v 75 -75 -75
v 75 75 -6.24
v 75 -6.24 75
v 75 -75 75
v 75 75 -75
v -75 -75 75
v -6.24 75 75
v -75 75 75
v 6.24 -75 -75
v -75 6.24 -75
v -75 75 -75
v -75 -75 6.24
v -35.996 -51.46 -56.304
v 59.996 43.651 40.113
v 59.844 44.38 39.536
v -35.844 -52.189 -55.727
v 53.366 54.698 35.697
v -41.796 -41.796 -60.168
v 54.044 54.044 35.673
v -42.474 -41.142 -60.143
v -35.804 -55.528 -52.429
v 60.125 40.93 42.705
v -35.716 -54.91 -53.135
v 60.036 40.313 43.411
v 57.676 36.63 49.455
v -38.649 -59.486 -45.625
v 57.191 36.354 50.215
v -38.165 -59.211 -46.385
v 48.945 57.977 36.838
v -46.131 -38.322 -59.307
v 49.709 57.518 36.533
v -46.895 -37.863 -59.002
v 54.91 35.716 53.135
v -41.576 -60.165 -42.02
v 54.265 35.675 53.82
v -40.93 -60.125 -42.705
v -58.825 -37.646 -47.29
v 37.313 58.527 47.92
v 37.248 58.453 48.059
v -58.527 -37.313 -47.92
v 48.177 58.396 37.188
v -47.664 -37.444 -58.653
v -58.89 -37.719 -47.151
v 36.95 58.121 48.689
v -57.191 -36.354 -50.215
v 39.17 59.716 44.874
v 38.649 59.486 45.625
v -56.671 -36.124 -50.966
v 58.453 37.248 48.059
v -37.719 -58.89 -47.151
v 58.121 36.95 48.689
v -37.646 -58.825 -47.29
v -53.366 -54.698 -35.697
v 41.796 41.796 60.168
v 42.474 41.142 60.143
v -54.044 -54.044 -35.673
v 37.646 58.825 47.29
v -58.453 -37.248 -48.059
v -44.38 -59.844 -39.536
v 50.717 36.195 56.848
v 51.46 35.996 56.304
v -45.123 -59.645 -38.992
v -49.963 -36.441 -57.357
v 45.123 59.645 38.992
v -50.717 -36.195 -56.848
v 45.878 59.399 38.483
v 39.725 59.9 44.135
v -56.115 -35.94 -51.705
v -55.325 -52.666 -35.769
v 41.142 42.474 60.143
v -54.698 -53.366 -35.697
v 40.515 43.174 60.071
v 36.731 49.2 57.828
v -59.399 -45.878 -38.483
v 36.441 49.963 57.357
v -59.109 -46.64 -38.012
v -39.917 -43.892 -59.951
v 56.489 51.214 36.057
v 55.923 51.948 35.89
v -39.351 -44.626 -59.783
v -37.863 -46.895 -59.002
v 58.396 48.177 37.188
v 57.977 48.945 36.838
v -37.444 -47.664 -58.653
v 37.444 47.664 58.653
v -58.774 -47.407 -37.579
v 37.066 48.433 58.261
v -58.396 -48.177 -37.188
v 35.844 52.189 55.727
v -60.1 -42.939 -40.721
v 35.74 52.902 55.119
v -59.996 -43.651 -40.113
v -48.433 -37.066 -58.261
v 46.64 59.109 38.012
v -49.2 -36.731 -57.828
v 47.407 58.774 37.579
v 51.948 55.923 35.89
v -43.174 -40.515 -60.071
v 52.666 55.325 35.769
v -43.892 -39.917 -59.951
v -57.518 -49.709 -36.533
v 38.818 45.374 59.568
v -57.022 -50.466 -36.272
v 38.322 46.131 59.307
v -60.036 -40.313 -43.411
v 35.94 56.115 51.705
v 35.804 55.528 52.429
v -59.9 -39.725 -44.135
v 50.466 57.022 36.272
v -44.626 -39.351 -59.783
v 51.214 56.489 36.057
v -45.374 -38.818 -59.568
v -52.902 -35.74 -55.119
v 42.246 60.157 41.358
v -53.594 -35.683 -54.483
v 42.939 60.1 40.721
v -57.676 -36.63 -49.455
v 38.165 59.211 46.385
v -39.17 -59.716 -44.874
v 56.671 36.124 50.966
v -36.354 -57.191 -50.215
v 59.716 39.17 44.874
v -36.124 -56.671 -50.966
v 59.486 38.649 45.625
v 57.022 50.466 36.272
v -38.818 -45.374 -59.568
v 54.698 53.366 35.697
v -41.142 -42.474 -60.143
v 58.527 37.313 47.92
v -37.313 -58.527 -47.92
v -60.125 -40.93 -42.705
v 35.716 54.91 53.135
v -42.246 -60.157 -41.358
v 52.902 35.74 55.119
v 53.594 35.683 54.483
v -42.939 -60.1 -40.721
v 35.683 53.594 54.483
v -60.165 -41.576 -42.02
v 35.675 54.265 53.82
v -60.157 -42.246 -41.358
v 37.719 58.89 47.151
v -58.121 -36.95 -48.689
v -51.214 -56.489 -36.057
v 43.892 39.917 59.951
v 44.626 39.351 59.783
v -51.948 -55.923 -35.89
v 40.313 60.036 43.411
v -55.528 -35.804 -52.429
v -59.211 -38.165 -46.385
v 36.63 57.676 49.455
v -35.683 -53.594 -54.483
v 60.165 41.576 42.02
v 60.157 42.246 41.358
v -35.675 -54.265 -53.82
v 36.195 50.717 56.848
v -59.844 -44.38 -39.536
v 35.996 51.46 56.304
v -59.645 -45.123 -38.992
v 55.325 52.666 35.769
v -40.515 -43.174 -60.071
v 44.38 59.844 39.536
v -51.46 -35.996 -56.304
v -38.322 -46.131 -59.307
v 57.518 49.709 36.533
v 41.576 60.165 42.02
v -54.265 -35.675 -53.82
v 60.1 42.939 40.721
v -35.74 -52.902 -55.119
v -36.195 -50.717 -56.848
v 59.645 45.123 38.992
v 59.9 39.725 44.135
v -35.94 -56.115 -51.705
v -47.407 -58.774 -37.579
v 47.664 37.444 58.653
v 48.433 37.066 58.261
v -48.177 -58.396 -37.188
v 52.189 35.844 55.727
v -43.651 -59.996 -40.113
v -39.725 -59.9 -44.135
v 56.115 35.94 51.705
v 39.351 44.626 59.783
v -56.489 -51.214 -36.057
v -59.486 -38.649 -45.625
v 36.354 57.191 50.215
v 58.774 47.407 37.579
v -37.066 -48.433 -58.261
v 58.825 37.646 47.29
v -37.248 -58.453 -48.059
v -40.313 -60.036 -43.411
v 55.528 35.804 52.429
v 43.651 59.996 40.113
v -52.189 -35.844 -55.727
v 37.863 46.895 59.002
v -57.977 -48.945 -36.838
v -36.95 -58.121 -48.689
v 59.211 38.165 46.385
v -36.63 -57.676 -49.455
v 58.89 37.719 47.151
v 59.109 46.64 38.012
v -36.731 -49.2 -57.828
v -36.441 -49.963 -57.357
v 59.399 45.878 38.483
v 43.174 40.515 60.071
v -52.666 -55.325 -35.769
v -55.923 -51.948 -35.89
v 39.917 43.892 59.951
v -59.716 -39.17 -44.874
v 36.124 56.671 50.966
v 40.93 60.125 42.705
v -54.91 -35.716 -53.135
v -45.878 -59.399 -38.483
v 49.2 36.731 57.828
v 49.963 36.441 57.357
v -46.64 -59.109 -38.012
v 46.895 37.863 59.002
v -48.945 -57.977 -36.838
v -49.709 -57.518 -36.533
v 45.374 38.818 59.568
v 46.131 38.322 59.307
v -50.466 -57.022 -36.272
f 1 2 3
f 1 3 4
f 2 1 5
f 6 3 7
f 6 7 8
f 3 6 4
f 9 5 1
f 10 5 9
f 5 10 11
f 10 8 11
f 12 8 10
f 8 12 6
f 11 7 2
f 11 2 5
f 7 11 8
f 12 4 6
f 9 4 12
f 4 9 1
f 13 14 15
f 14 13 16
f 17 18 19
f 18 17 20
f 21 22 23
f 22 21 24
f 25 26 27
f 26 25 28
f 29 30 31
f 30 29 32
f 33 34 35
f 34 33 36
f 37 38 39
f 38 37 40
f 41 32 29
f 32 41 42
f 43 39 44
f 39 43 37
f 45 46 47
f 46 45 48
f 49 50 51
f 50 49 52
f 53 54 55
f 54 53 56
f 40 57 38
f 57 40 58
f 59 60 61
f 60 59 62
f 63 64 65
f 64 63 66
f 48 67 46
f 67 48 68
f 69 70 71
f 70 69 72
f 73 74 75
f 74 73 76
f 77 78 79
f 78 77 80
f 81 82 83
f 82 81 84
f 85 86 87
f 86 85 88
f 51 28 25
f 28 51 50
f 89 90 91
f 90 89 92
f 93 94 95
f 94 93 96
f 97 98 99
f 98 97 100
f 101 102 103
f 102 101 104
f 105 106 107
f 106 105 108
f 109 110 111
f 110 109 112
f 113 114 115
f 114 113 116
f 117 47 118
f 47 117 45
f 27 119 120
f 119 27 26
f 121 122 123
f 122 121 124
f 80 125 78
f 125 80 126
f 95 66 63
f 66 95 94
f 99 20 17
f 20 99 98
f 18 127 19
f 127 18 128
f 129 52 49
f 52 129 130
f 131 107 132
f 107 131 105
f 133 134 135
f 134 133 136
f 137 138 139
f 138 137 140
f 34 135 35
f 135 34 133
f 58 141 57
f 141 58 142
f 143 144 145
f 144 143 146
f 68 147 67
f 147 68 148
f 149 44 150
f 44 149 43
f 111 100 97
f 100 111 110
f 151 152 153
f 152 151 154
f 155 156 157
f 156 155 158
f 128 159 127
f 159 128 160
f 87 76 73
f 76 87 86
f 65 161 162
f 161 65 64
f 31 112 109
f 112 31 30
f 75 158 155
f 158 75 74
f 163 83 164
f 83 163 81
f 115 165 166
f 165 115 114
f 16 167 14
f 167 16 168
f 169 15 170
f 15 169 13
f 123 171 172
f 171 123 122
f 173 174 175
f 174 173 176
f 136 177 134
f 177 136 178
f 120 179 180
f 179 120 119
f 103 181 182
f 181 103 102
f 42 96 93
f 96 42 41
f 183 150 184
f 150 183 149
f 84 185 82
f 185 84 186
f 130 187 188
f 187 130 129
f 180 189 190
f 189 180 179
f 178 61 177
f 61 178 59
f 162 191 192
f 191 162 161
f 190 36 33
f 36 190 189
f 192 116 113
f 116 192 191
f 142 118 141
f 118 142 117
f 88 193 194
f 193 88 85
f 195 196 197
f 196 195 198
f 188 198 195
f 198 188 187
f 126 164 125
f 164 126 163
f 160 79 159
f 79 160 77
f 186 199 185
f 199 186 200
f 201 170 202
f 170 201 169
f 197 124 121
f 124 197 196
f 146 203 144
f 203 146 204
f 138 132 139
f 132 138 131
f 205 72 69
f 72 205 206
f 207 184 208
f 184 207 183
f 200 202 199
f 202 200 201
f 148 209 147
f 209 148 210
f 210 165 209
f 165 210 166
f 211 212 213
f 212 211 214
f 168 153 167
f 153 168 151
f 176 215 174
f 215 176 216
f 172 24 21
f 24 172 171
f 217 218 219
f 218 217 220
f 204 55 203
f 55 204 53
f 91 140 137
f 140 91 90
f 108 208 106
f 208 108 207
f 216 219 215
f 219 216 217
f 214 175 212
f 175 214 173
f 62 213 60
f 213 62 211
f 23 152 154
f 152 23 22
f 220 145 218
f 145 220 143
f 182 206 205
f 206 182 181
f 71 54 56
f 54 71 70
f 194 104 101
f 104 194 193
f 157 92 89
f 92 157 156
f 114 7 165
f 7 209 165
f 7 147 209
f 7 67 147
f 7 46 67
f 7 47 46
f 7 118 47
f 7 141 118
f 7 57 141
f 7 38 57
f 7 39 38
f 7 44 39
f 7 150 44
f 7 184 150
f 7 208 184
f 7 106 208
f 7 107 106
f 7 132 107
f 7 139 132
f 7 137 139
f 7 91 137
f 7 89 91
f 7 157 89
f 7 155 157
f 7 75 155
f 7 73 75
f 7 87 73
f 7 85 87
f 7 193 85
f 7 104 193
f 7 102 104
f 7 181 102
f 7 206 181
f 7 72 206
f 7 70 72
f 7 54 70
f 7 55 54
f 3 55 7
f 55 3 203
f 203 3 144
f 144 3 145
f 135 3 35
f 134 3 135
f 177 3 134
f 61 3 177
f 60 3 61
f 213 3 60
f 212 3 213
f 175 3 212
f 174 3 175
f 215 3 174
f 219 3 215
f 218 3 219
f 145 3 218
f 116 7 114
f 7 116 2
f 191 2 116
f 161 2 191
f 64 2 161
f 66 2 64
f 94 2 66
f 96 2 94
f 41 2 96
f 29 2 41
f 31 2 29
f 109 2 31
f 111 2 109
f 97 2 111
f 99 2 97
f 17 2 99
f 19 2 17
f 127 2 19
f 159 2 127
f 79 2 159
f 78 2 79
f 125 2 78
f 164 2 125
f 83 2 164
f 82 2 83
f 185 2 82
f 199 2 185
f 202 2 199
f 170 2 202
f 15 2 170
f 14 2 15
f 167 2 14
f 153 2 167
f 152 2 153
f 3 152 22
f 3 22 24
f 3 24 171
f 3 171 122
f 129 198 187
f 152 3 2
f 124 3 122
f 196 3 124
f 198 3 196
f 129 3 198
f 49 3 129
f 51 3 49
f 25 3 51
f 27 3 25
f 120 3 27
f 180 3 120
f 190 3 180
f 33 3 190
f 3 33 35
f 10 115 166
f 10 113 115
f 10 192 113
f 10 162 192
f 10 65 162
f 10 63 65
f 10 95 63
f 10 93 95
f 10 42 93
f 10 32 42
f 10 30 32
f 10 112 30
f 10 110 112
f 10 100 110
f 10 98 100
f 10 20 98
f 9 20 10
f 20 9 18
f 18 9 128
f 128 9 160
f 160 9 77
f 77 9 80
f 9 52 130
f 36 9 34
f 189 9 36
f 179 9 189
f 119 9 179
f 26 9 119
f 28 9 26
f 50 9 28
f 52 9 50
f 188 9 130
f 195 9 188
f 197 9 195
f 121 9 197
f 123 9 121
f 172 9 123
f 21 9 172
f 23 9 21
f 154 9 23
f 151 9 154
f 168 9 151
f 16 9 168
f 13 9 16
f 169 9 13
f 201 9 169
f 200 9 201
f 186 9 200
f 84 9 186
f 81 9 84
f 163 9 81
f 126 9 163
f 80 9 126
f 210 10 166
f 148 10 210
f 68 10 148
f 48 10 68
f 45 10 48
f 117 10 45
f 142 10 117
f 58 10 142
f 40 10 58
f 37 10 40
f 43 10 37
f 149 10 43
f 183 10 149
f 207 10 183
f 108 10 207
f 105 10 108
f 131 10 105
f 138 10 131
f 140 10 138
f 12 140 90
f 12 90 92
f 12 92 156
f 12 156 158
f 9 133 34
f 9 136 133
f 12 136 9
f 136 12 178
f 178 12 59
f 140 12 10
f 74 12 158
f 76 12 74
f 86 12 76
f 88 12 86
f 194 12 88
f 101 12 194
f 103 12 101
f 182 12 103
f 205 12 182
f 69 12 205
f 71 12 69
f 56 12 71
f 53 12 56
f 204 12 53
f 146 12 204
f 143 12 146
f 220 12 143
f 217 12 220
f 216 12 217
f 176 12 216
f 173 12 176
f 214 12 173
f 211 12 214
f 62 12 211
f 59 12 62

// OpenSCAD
// file: Library_2021.scad
$fn = 100;//This number should normally be around or at 100.


//===========================================================================================================================
//===========================================================================================================================
module sqaure_torus(outerXlength, outerYlength, innerXlength, innerYlength, obritalDis, angleHere){//Sqaure torus
rotate_extrude(angle = angleHere,convexity = 10){
translate([obritalDis + outerXlength / 2, outerYlength / 2, 0])
    difference(){
        square([outerXlength, outerYlength], center = true);
        square([innerXlength, innerYlength], center = true);
        
        }
    }
}
//===========================================================================================================================
//===========================================================================================================================
module torus(outerRadius, innerRadius, orbitalDistance, angleHere){// Donut shape
    rotate_extrude(angle= angleHere, convexity= 10){
        translate([orbitalDistance, 0, 0])
            difference(){
                circle(outerRadius);
                circle(innerRadius);
                }
        }
    assert(angleHere <= 360, "angle is greater than 360!");
    assert(outerRadius > innerRadius, "Inner circle is greater than outer circle!");
    assert(orbitalDistance > 0, "orbital radius is less than zero!");
    }
//===========================================================================================================================
//===========================================================================================================================
module orbital_cylinders(OrbitalRadius, NumberOfCylinders, cylinderRadius, Height, Xtilt, Ytilt){// cuts circles in a circle
    for (Hole = [0:NumberOfCylinders]){
        rotate([0, 0, 360/NumberOfCylinders])
        translate([OrbitalRadius, 0, 0])
        rotate([Xtilt, Ytilt,0])
            cylinder(Height, r= cylinderRadius);
        }
    }
//===========================================================================================================================
//===========================================================================================================================
module annulus(OuterRadius, InnerRadius, Height){//Pipe shape
    differnce(){
        //Prime object
        cylinder(Height, r= OuterRadius);
        //Cutting object(s)
        cylinder(Height, r= InnerRadius);
        }
    }
//==========================================================================================================================
//==========================================================================================================================
module ceinture(OuterRadius, InnerRadius, Height, BetweenCenters){// Belt shape
    difference(){
        hull(){//Prime object
            cylinder(Height, r= outerRadius);
            translate([BetweenCenters, 0, 0])
                cylinder(Height, r= outerRadius);
            }
        hull(){//Cutting object
            cylinder(Height, r= InnerRadius);
            translate([BetweenCenters, 0, 0])
                cylinder(Height, r= InnerRadius);
            }
        }
    }
//==========================================================================================================================
//==========================================================================================================================
module triangle(type, leg_a, leg_b,hypotenuse){// draws right, scalene, isosceles and equilateral triangles
    if(type == "right"){
        polygon( points = [[0, 0],[leg_a, 0],[0, leg_b]]);
            }
        else if(type == "scalene"){
            hypotenuse = sqrt(pow(leg_a, 2) + pow(leg_b, 2));
                polygon(points = [[0,-(leg_a/2)],[leg_b,0],[0,hypotenuse]]);
            }
        else if(type == "isosceles"){
                polygon(points = [[0,-(leg_a/2)],[leg_b,0],[0,(leg_a/2)]]);
            }
        else if(type == "equilateral"){
                polygon(points = [[0,-(leg_a/2)],[leg_a,0],[0,leg_a]]);
            }
    }
//==========================================================================================================================
//==========================================================================================================================
module _name_(){}
//==========================================================================================================================
//==========================================================================================================================
module _name_(){}
//==========================================================================================================================
//==========================================================================================================================
module _name_(){}
//==========================================================================================================================
//==========================================================================================================================
// main file
$fn = 100;
mm = 1;
degree = 1;
diameter = .5;
use <Library_2021.scad>

echo (sqrt(pow(150,2) + pow(150,2)));
x= 150; y = 150; z = 150; // point coordinates of end of cylinder
 
length = norm([x,y,z]);  // radial distance
b = acos(z/length); // inclination angle
c = atan2(y,x);     // azimuthal angle
Zoffset = 83 + 75;


p1=[-5,75,75];
p2=[75,-5,75];
p3=[75,75,-5];
Center=(p1+p2+p3)/3;

echo(len=sqrt(pow(Center[0],2)+pow(Center[1],2)+pow(Center[2],2)));


difference(){
cube([x,y,z],center= true); // corner of cube should coincide with end of cylinder
#rotate([0, b, c]) 
    cylinder(h=length, r=15, center= true);
#rotate([0, b, c])
translate([0,0,Zoffset])
    cube([x,y,z],center= true);
#rotate([0, b, c])
translate([0,0,-Zoffset])
    cube([x,y,z],center= true);
}
